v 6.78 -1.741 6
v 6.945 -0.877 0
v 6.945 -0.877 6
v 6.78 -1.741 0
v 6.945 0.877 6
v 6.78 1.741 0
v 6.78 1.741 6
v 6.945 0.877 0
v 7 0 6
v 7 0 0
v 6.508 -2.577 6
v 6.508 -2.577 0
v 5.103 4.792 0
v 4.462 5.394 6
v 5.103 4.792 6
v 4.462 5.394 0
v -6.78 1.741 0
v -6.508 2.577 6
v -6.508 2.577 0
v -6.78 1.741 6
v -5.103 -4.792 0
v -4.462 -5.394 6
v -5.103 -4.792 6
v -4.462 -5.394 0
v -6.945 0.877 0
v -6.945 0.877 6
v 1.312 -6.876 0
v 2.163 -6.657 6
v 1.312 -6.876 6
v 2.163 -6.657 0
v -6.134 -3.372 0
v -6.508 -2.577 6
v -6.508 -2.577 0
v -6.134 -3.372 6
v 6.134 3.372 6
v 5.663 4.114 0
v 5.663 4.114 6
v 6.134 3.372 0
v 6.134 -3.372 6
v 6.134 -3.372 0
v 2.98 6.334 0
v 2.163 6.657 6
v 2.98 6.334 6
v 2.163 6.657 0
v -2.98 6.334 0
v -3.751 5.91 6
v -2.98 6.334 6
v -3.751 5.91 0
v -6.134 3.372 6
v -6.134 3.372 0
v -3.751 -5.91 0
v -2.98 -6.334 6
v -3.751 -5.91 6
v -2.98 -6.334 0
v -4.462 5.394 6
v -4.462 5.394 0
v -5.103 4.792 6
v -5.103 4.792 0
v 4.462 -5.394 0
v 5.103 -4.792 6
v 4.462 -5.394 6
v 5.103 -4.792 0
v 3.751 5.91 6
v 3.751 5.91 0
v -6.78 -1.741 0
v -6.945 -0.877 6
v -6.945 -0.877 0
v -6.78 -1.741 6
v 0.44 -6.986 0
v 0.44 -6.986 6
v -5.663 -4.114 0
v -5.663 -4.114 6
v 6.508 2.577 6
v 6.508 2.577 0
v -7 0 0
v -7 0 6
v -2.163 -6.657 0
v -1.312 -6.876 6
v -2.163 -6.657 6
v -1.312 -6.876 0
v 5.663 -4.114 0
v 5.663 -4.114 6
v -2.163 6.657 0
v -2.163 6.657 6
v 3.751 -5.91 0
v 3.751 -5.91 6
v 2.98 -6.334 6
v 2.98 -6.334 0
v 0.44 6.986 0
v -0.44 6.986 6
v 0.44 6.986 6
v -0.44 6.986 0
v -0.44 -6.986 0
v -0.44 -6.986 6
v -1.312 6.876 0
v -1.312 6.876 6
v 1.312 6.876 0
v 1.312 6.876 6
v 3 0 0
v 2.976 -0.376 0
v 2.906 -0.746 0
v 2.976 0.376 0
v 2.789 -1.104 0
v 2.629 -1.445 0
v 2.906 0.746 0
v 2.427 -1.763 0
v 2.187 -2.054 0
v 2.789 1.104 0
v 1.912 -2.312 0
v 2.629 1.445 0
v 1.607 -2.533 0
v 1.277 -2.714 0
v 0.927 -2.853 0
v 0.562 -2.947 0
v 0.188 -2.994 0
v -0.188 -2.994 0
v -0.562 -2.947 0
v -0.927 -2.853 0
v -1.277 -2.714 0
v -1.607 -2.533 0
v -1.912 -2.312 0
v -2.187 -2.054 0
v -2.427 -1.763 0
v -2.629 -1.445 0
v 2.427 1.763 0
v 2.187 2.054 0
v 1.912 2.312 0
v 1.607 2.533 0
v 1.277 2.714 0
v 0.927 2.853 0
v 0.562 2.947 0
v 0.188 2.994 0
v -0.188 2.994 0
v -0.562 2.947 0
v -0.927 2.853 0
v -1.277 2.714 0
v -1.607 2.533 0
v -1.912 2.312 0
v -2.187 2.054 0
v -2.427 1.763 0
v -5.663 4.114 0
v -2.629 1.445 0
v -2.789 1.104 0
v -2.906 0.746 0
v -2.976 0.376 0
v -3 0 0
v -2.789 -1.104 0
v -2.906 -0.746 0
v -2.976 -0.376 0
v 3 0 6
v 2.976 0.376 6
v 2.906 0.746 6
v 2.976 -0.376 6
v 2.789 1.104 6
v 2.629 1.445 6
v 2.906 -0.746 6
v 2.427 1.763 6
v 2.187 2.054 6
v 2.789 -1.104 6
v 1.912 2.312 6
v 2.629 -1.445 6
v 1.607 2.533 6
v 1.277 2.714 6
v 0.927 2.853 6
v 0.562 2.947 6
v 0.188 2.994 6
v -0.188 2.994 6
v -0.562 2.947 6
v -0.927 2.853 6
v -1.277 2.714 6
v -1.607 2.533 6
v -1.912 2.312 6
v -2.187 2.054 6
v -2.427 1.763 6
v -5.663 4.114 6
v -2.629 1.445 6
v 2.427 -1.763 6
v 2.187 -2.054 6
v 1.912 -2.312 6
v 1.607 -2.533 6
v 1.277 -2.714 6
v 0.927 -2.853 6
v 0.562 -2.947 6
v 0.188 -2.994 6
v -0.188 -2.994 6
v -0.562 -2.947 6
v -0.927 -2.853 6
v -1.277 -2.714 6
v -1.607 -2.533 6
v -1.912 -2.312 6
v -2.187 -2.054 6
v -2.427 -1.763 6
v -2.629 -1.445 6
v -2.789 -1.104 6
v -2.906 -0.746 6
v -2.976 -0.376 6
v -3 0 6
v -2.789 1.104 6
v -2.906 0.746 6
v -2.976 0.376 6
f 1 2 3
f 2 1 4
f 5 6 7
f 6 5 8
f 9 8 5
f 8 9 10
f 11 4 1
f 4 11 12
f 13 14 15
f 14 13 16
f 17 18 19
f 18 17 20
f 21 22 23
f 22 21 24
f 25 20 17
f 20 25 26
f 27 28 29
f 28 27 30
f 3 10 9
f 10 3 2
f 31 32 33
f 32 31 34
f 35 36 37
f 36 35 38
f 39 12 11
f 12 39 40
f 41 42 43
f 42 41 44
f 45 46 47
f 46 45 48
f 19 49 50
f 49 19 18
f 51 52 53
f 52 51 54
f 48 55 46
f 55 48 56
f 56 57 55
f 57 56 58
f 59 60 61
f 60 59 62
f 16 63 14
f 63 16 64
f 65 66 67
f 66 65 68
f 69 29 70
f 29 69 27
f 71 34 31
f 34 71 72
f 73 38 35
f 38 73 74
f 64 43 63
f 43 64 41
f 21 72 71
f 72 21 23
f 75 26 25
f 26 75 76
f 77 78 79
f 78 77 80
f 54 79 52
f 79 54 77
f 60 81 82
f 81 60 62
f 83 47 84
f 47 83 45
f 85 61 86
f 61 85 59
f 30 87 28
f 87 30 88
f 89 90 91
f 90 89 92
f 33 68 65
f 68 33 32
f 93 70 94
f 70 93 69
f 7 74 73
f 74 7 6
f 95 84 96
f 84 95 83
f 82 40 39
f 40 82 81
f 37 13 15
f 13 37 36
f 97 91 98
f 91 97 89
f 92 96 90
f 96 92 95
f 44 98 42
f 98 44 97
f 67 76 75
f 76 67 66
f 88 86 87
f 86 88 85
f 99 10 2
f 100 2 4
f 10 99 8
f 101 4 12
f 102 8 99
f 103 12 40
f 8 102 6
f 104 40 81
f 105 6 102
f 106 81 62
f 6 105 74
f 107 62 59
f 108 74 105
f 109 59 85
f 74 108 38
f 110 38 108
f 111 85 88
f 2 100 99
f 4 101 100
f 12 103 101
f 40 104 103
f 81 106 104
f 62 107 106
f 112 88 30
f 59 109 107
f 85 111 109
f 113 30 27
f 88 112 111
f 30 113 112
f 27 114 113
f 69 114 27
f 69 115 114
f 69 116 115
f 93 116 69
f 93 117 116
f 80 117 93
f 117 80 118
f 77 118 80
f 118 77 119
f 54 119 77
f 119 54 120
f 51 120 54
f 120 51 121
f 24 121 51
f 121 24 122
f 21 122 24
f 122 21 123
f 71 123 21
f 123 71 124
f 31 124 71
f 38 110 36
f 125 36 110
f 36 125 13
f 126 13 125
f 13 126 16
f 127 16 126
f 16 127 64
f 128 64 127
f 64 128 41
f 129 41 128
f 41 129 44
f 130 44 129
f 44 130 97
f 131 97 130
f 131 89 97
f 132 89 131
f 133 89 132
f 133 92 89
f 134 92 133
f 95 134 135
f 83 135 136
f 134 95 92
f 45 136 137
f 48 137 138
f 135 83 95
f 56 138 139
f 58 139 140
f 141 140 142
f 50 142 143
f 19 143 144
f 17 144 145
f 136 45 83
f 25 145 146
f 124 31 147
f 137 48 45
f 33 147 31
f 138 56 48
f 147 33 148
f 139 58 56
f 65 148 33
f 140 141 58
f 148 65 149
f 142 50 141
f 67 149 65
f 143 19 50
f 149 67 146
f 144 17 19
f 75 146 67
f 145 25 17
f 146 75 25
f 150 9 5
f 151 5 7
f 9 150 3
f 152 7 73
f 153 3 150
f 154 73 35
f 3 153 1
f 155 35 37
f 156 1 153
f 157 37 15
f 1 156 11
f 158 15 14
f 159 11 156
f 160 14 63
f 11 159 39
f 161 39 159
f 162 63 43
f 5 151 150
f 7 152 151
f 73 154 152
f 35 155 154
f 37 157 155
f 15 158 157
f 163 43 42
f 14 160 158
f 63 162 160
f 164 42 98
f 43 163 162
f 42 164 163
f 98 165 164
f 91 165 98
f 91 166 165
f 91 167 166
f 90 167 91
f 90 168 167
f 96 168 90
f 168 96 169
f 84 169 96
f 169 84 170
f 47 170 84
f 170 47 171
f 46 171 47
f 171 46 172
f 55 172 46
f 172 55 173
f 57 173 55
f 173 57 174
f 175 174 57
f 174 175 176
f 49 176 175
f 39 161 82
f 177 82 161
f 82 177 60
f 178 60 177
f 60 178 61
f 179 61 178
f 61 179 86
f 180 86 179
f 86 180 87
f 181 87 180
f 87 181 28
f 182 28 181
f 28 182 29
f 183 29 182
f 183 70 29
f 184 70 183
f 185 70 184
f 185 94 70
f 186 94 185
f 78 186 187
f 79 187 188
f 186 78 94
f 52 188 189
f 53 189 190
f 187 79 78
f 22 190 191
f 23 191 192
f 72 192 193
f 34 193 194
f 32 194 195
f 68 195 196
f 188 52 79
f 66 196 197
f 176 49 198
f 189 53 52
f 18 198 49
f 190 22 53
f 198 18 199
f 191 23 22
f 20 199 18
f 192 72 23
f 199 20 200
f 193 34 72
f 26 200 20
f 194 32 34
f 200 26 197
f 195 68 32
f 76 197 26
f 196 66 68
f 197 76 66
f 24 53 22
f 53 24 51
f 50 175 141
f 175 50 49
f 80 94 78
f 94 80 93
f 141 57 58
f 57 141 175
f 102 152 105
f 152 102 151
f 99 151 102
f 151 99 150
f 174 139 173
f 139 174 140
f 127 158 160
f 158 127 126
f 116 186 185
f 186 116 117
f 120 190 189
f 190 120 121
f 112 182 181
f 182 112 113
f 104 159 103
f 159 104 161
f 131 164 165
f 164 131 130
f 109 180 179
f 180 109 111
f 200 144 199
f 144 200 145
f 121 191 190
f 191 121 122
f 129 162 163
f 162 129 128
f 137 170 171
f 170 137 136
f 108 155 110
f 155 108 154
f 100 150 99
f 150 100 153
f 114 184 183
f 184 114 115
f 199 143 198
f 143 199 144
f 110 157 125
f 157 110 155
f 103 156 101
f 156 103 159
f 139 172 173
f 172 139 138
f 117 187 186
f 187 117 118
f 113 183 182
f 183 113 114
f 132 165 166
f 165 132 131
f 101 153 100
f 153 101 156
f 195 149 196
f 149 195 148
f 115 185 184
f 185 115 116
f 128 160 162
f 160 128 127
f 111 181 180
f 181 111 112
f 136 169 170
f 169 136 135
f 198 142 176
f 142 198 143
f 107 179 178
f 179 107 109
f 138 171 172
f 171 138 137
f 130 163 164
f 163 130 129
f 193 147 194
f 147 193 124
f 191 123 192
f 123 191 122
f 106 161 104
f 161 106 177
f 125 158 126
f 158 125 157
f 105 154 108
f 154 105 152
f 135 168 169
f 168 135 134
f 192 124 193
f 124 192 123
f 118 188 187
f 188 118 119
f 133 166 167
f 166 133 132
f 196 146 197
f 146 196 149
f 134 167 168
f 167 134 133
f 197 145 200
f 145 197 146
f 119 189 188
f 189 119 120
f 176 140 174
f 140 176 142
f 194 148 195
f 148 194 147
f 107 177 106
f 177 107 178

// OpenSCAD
$fn = 50;


difference() {
	union() {
		cylinder(h = 6, r = 7.0000000000);
	}
	union() {
		translate(v = [0, 0, -100]) {
			cylinder(h = 200, r = 3.0000000000);
		}
	}
}
